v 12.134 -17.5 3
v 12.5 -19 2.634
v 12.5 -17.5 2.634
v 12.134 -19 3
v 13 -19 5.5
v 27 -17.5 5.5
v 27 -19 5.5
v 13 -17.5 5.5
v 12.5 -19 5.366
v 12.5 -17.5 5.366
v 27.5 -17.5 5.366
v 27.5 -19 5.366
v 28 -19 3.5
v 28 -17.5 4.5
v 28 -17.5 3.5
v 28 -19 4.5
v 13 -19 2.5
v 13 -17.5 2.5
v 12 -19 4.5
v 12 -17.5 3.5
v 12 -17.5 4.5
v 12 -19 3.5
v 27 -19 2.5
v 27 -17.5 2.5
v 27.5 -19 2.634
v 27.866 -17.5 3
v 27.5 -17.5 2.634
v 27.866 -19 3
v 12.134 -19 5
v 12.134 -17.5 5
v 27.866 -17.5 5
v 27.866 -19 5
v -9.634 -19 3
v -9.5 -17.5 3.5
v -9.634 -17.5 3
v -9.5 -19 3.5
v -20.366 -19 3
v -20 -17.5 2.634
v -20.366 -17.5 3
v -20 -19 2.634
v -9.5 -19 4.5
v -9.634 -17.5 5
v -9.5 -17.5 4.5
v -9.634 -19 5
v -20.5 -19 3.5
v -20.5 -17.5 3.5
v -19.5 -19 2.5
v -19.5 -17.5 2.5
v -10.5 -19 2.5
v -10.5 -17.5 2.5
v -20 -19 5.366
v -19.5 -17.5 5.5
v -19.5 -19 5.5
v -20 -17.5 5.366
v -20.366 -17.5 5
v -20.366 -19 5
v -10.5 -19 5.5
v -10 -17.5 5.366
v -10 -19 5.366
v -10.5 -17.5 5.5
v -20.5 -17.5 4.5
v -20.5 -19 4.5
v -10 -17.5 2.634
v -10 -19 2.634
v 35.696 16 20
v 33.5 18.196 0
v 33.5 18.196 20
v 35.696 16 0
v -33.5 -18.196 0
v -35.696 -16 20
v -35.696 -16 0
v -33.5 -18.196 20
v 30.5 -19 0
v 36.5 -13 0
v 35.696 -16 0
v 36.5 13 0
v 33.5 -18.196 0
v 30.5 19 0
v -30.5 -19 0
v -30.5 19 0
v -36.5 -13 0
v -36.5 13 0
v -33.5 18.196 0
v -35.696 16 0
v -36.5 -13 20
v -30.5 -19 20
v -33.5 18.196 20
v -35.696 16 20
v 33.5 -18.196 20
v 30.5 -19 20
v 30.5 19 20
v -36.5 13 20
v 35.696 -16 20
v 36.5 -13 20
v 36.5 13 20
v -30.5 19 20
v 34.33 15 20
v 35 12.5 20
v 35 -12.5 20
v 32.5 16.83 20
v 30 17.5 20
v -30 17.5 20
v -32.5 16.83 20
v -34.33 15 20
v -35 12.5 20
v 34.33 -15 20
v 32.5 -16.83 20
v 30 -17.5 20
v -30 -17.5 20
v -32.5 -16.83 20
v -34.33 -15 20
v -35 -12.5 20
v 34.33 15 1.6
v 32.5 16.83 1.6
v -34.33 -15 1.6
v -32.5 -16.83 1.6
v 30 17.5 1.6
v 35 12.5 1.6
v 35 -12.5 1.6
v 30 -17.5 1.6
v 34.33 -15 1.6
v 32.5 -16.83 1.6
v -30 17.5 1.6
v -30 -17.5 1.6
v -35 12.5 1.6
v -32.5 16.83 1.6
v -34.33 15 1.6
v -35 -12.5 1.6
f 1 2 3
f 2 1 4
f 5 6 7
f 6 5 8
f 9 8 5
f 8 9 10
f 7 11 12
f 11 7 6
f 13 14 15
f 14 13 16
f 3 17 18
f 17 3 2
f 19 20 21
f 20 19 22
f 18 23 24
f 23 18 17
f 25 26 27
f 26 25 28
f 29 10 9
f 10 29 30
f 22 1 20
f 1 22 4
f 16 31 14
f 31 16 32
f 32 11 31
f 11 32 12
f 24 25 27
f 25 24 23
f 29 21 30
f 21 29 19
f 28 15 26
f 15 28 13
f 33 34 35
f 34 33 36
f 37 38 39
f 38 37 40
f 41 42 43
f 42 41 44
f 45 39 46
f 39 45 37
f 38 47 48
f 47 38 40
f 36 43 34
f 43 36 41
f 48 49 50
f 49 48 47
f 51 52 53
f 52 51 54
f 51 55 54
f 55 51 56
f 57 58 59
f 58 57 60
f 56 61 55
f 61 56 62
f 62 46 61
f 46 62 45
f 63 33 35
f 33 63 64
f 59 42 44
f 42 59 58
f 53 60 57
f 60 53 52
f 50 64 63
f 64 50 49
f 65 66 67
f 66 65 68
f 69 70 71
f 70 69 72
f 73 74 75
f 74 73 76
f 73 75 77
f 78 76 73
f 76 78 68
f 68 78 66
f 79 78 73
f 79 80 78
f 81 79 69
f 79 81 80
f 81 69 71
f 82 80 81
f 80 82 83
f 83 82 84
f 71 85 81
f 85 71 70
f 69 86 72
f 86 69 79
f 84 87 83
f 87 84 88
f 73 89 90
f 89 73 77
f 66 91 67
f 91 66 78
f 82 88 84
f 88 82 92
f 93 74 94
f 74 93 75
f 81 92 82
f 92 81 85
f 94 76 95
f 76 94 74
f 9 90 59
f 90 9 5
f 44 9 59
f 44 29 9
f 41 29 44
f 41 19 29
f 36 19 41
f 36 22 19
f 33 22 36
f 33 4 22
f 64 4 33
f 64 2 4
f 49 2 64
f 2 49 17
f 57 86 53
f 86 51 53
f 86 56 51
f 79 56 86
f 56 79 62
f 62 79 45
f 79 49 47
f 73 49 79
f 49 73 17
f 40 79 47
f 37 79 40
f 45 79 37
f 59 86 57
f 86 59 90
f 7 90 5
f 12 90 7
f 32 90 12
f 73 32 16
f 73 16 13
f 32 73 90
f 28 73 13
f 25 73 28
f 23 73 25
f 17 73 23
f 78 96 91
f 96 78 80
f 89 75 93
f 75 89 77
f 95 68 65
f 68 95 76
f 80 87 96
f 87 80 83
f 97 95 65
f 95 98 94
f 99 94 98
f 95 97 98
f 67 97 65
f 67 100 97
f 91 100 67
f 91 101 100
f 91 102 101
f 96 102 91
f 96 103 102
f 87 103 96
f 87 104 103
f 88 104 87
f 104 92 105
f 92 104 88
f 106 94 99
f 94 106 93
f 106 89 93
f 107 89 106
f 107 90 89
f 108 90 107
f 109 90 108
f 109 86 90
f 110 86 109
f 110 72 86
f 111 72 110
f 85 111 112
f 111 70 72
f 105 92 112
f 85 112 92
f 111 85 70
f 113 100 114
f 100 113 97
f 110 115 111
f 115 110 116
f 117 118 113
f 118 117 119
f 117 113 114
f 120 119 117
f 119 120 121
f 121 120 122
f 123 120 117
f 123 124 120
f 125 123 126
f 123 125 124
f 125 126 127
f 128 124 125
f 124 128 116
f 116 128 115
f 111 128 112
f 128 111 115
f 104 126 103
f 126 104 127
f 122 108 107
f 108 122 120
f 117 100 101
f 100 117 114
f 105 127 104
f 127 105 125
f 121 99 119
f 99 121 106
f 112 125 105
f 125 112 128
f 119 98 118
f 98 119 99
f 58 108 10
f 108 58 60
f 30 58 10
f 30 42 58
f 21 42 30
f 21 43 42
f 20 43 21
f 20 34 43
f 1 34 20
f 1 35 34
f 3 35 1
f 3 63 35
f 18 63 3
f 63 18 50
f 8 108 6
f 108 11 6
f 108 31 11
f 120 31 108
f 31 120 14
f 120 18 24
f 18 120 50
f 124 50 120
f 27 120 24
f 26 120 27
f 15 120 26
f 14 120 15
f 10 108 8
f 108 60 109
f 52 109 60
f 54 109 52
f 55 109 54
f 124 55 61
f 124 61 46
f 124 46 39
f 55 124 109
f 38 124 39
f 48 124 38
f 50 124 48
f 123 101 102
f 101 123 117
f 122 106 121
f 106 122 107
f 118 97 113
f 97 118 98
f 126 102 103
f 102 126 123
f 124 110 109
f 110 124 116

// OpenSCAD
// Pi
//translate([0,0,1.6])
//color([0.2,1,0,1])
//roundedRect([65, 30, 1.6], 5, $fn=12);

// Case

color([1,1,1,1])
difference(){
roundedRect([67, 32, 20], 6, $fn=12);
translate([0,0,1.6])roundedRect([65, 30, 20], 5, $fn=12);

rotate([90,0,0])
translate([0,4,10])
{
translate([20,0,0])roundedRect([15,2,10], 1, $fn=12);
translate([-15,0,0])roundedRect([10,2,10], 1, $fn=12);
}




}











module roundedRect(size, radius)
{
	x = size[0];
	y = size[1];
	z = size[2];

	linear_extrude(height=z)
	hull()
	{
		// place 4 circles in the corners, with the given radius
		translate([(-x/2)+(radius/2), (-y/2)+(radius/2), 0])
		circle(r=radius);
	
		translate([(x/2)-(radius/2), (-y/2)+(radius/2), 0])
		circle(r=radius);
	
		translate([(-x/2)+(radius/2), (y/2)-(radius/2), 0])
		circle(r=radius);
	
		translate([(x/2)-(radius/2), (y/2)-(radius/2), 0])
		circle(r=radius);
	}
}
